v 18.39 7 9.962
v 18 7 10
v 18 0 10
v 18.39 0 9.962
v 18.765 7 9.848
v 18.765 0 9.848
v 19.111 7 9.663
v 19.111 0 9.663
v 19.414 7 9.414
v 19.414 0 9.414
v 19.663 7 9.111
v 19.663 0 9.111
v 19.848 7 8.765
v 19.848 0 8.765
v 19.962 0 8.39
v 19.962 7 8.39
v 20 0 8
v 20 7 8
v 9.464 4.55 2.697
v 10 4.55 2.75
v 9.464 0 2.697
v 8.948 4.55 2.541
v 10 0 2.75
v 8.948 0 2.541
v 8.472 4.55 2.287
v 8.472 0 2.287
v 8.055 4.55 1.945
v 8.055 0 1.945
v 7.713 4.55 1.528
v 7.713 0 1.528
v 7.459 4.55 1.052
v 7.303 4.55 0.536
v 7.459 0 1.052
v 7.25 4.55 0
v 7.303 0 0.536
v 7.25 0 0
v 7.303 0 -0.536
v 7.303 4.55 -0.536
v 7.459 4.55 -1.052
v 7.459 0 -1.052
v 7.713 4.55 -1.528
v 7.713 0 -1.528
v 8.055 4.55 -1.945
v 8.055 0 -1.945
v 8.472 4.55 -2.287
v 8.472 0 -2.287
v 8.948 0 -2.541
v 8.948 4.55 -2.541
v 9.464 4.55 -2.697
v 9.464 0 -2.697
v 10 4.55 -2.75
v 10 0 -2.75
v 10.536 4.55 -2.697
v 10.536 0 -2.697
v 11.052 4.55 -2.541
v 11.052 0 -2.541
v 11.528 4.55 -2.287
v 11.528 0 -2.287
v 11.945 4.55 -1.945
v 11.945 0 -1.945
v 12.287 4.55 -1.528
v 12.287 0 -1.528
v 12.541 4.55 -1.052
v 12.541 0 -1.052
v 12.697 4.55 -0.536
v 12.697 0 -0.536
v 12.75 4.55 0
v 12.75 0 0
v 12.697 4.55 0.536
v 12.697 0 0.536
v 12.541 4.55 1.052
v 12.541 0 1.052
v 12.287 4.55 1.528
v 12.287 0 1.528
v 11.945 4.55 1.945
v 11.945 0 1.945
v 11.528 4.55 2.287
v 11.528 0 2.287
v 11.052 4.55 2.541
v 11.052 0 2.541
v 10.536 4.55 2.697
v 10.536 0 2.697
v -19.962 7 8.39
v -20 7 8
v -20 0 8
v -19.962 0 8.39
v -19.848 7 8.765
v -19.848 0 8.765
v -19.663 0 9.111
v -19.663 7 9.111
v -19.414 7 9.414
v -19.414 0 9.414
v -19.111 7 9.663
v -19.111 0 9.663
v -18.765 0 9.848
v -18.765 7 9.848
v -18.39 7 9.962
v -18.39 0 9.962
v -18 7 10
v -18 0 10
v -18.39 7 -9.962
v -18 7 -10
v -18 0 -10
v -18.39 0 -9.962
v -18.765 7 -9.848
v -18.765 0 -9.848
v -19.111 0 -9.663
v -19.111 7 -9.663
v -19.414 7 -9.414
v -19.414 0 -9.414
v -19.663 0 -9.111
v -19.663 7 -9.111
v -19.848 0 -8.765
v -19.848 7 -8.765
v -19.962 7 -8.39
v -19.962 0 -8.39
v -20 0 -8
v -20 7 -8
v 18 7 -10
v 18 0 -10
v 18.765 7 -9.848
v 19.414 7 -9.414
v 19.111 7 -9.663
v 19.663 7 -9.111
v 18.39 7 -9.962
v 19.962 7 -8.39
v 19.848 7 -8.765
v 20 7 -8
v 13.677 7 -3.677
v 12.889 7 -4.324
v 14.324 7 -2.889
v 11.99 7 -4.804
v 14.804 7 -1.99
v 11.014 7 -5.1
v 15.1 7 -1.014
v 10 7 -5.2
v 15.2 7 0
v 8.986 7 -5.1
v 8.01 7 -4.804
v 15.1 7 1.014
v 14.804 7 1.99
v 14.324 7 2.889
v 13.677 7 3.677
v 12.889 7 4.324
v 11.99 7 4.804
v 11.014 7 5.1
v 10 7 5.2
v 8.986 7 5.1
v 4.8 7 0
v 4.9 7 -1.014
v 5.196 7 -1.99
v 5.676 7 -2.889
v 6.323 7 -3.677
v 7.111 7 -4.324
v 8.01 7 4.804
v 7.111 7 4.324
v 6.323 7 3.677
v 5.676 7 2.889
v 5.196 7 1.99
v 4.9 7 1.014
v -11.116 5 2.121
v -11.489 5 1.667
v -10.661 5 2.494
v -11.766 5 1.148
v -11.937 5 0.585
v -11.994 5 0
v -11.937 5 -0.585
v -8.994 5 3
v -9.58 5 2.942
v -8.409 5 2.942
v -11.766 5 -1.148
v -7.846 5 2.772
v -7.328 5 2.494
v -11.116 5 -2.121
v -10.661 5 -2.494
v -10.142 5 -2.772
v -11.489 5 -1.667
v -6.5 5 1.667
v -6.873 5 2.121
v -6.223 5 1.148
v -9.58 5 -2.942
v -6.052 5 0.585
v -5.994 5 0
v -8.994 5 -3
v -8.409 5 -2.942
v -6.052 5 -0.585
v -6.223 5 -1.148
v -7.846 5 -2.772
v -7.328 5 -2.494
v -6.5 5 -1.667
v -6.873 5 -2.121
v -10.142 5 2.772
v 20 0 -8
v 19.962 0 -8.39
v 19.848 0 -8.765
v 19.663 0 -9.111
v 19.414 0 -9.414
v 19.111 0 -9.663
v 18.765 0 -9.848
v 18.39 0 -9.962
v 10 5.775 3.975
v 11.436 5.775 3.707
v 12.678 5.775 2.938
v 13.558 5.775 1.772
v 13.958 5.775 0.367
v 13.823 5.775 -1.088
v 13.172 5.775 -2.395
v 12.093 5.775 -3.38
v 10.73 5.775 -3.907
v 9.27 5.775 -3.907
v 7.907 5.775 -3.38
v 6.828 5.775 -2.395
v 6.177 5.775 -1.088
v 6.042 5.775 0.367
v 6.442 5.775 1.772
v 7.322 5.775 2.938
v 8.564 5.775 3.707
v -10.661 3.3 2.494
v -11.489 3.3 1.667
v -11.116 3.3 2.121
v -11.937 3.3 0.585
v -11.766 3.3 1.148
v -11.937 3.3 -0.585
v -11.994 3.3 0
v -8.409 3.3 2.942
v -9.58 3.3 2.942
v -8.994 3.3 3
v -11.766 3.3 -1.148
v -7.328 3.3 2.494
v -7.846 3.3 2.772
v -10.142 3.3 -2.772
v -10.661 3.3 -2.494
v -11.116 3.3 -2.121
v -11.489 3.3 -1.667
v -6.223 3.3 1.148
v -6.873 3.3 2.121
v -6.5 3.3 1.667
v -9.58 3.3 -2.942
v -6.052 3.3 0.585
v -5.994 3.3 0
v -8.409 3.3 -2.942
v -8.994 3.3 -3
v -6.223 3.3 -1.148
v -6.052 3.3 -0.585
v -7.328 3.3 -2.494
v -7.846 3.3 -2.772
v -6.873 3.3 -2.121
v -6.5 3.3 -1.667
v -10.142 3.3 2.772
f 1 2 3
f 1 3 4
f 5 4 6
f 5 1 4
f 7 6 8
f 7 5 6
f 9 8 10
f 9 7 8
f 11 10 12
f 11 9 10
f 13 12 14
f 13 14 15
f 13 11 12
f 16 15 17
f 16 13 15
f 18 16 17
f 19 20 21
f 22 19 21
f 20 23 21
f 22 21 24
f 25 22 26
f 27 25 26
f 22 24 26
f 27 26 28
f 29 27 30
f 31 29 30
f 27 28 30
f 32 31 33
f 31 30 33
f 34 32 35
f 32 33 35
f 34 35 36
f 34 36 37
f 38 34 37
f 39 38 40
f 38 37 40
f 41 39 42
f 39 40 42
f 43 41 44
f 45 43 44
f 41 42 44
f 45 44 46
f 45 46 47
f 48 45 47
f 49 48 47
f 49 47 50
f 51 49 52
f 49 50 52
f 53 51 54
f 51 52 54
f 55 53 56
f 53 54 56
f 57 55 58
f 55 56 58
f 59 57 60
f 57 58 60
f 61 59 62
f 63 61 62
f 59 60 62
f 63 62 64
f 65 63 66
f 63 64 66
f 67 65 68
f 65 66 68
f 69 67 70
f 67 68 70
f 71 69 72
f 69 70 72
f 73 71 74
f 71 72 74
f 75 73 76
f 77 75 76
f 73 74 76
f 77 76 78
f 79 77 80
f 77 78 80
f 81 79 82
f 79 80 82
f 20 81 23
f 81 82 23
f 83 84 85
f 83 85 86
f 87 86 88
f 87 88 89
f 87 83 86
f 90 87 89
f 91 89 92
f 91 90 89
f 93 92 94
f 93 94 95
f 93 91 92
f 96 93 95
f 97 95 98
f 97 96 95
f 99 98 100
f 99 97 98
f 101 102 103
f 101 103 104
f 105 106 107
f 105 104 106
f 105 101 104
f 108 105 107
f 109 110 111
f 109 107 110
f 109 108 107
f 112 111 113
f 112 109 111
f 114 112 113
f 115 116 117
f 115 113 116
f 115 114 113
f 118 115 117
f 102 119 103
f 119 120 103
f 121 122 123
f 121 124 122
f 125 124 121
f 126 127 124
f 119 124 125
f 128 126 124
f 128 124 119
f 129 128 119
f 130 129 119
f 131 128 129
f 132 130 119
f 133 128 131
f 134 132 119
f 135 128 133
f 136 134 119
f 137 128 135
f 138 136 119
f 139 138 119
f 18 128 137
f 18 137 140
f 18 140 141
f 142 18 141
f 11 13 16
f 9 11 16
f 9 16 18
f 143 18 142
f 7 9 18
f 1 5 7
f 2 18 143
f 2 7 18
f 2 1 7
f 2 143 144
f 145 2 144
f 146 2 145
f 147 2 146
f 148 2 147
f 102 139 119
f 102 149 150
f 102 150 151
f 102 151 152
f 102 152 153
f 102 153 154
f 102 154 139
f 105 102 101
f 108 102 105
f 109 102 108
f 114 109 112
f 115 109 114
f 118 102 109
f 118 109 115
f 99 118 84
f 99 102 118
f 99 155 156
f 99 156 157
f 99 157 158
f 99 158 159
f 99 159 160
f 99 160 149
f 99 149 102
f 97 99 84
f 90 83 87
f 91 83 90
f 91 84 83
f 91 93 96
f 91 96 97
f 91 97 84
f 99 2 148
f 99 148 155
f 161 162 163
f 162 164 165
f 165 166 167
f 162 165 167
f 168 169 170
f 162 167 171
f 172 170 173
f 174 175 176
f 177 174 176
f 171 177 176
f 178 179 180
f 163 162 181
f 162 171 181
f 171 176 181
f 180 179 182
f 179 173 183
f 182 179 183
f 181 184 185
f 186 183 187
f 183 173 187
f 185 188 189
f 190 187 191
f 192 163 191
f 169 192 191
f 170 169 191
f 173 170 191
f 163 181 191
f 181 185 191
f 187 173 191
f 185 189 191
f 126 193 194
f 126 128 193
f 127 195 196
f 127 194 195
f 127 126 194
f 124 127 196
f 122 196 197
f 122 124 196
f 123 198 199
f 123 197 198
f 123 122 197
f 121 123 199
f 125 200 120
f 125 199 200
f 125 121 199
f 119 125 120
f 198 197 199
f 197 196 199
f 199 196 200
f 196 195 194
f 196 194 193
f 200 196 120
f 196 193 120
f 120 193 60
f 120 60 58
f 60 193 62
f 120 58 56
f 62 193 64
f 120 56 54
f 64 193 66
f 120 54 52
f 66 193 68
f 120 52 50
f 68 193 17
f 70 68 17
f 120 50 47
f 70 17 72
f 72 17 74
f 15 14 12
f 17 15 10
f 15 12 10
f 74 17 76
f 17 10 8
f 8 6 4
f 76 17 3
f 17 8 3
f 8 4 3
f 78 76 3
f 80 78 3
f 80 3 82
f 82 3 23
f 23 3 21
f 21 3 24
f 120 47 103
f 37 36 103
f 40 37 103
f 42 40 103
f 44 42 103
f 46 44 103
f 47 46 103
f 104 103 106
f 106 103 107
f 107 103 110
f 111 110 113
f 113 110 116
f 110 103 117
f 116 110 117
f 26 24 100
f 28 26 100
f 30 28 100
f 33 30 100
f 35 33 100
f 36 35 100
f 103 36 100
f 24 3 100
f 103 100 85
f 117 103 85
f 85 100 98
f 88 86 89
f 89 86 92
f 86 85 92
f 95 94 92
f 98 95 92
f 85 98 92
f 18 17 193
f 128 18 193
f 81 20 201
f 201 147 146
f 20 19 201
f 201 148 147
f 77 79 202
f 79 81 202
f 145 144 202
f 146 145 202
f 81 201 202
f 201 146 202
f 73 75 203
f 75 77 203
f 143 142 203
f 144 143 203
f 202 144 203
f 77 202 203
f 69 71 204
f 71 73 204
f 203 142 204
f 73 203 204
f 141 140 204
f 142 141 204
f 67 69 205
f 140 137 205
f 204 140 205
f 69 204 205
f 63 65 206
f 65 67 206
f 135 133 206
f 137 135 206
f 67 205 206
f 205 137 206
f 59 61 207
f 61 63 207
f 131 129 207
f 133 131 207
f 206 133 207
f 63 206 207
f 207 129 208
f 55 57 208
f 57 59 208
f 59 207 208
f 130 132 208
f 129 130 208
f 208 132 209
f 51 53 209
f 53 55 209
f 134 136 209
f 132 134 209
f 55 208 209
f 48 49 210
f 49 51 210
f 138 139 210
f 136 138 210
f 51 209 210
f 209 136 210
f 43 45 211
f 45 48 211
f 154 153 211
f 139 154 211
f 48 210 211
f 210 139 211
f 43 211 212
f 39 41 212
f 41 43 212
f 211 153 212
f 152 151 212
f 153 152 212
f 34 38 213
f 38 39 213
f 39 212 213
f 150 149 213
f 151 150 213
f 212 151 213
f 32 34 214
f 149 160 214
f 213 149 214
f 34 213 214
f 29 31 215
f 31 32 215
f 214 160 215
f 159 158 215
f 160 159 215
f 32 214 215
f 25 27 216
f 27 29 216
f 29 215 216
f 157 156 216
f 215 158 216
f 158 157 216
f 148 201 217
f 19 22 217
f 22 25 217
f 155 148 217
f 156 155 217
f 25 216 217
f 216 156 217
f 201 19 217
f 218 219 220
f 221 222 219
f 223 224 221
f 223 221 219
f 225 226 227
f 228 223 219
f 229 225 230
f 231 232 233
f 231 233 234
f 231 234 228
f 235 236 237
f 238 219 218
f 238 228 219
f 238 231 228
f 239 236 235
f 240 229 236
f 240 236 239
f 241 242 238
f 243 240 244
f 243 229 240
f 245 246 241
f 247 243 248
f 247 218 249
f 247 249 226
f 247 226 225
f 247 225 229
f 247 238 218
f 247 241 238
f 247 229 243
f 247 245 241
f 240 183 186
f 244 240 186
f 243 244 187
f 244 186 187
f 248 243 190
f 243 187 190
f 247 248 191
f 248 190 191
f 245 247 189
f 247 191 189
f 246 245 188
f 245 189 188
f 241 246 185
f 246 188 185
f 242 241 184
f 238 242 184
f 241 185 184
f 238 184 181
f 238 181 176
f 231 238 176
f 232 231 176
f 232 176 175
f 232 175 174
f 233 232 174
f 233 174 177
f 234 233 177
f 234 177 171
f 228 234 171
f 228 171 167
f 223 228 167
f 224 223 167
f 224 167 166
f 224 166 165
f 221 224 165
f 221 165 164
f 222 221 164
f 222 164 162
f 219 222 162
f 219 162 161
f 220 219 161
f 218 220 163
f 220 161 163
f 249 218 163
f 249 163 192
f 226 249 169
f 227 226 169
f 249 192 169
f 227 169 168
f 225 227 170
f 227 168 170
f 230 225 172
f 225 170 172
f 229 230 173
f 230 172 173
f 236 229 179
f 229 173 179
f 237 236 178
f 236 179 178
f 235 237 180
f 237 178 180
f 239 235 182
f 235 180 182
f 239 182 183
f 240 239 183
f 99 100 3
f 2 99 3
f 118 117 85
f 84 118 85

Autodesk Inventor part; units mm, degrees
ref_plane "YZ Plane" through (0, 0, 0) normal (1, 0, 0) x (0, 1, 0)
ref_plane "XZ Plane" through (0, 0, 0) normal (0, 1, 0) x (-1, 0, 0)
ref_plane "XY Plane" through (0, 0, 0) normal (0, 0, 1) x (1, 0, 0)
sketch "Sketch1" plane through (0, 0, 0) normal (0, 1, 0) x (-1, 0, 0)
  line L0 (2.1258, 0) -> (-2.1258, 0) construction
  line L1 (0, 4.2515) -> (0, -4.2515) construction
  line L2 (20, 10) -> (-20, 10)
  line L3 (-20, 10) -> (-20, -10)
  line L4 (-20, -10) -> (20, -10)
  line L5 (20, -10) -> (20, 10)
  point P0 (0, 0)
  point P1 (0, 0)
  dimension "d1" = 20
  dimension "d2" = 20
  dimension "d3" = 20
extrude "Extrusion1" add sketch "Sketch1" along normal blind 7
sketch "Sketch2" plane through (0, 7, 0) normal (0, 1, 0) x (1, 0, 0)
  point P0 (0, 0)
  point P1 (10, 0)
  dimension "d6" = 10
hole "Hole1" at (10, 7, 0) direction (0, -1, 0) diameter 5.5 end through all countersink diameter 10.4 countersink angle 90 clearance for "Countersunk Flat Head Screw DIN EN ISO 2009" size "M5" standard "DIN"
ref_plane "Work Plane1" through (0, 5, 0) normal (0, 1, 0) x (1, 0, 0)
sketch "Sketch3" plane through (0, 5, 0) normal (0, 1, 0) x (1, 0, 0)
  circle A0 centre (-8.9944, 0) radius 3
  point P0 (0, 0)
  dimension "d15" = 6
extrude "Extrusion2" cut sketch "Sketch3" against normal blind 1.7
fillet "Fillet1" radius 2 4 edges at (-20, 3.5, 10) (-20, 3.5, -10) (20, 3.5, 10) (20, 3.5, -10)
properties part number "MagnetHolderV1"
